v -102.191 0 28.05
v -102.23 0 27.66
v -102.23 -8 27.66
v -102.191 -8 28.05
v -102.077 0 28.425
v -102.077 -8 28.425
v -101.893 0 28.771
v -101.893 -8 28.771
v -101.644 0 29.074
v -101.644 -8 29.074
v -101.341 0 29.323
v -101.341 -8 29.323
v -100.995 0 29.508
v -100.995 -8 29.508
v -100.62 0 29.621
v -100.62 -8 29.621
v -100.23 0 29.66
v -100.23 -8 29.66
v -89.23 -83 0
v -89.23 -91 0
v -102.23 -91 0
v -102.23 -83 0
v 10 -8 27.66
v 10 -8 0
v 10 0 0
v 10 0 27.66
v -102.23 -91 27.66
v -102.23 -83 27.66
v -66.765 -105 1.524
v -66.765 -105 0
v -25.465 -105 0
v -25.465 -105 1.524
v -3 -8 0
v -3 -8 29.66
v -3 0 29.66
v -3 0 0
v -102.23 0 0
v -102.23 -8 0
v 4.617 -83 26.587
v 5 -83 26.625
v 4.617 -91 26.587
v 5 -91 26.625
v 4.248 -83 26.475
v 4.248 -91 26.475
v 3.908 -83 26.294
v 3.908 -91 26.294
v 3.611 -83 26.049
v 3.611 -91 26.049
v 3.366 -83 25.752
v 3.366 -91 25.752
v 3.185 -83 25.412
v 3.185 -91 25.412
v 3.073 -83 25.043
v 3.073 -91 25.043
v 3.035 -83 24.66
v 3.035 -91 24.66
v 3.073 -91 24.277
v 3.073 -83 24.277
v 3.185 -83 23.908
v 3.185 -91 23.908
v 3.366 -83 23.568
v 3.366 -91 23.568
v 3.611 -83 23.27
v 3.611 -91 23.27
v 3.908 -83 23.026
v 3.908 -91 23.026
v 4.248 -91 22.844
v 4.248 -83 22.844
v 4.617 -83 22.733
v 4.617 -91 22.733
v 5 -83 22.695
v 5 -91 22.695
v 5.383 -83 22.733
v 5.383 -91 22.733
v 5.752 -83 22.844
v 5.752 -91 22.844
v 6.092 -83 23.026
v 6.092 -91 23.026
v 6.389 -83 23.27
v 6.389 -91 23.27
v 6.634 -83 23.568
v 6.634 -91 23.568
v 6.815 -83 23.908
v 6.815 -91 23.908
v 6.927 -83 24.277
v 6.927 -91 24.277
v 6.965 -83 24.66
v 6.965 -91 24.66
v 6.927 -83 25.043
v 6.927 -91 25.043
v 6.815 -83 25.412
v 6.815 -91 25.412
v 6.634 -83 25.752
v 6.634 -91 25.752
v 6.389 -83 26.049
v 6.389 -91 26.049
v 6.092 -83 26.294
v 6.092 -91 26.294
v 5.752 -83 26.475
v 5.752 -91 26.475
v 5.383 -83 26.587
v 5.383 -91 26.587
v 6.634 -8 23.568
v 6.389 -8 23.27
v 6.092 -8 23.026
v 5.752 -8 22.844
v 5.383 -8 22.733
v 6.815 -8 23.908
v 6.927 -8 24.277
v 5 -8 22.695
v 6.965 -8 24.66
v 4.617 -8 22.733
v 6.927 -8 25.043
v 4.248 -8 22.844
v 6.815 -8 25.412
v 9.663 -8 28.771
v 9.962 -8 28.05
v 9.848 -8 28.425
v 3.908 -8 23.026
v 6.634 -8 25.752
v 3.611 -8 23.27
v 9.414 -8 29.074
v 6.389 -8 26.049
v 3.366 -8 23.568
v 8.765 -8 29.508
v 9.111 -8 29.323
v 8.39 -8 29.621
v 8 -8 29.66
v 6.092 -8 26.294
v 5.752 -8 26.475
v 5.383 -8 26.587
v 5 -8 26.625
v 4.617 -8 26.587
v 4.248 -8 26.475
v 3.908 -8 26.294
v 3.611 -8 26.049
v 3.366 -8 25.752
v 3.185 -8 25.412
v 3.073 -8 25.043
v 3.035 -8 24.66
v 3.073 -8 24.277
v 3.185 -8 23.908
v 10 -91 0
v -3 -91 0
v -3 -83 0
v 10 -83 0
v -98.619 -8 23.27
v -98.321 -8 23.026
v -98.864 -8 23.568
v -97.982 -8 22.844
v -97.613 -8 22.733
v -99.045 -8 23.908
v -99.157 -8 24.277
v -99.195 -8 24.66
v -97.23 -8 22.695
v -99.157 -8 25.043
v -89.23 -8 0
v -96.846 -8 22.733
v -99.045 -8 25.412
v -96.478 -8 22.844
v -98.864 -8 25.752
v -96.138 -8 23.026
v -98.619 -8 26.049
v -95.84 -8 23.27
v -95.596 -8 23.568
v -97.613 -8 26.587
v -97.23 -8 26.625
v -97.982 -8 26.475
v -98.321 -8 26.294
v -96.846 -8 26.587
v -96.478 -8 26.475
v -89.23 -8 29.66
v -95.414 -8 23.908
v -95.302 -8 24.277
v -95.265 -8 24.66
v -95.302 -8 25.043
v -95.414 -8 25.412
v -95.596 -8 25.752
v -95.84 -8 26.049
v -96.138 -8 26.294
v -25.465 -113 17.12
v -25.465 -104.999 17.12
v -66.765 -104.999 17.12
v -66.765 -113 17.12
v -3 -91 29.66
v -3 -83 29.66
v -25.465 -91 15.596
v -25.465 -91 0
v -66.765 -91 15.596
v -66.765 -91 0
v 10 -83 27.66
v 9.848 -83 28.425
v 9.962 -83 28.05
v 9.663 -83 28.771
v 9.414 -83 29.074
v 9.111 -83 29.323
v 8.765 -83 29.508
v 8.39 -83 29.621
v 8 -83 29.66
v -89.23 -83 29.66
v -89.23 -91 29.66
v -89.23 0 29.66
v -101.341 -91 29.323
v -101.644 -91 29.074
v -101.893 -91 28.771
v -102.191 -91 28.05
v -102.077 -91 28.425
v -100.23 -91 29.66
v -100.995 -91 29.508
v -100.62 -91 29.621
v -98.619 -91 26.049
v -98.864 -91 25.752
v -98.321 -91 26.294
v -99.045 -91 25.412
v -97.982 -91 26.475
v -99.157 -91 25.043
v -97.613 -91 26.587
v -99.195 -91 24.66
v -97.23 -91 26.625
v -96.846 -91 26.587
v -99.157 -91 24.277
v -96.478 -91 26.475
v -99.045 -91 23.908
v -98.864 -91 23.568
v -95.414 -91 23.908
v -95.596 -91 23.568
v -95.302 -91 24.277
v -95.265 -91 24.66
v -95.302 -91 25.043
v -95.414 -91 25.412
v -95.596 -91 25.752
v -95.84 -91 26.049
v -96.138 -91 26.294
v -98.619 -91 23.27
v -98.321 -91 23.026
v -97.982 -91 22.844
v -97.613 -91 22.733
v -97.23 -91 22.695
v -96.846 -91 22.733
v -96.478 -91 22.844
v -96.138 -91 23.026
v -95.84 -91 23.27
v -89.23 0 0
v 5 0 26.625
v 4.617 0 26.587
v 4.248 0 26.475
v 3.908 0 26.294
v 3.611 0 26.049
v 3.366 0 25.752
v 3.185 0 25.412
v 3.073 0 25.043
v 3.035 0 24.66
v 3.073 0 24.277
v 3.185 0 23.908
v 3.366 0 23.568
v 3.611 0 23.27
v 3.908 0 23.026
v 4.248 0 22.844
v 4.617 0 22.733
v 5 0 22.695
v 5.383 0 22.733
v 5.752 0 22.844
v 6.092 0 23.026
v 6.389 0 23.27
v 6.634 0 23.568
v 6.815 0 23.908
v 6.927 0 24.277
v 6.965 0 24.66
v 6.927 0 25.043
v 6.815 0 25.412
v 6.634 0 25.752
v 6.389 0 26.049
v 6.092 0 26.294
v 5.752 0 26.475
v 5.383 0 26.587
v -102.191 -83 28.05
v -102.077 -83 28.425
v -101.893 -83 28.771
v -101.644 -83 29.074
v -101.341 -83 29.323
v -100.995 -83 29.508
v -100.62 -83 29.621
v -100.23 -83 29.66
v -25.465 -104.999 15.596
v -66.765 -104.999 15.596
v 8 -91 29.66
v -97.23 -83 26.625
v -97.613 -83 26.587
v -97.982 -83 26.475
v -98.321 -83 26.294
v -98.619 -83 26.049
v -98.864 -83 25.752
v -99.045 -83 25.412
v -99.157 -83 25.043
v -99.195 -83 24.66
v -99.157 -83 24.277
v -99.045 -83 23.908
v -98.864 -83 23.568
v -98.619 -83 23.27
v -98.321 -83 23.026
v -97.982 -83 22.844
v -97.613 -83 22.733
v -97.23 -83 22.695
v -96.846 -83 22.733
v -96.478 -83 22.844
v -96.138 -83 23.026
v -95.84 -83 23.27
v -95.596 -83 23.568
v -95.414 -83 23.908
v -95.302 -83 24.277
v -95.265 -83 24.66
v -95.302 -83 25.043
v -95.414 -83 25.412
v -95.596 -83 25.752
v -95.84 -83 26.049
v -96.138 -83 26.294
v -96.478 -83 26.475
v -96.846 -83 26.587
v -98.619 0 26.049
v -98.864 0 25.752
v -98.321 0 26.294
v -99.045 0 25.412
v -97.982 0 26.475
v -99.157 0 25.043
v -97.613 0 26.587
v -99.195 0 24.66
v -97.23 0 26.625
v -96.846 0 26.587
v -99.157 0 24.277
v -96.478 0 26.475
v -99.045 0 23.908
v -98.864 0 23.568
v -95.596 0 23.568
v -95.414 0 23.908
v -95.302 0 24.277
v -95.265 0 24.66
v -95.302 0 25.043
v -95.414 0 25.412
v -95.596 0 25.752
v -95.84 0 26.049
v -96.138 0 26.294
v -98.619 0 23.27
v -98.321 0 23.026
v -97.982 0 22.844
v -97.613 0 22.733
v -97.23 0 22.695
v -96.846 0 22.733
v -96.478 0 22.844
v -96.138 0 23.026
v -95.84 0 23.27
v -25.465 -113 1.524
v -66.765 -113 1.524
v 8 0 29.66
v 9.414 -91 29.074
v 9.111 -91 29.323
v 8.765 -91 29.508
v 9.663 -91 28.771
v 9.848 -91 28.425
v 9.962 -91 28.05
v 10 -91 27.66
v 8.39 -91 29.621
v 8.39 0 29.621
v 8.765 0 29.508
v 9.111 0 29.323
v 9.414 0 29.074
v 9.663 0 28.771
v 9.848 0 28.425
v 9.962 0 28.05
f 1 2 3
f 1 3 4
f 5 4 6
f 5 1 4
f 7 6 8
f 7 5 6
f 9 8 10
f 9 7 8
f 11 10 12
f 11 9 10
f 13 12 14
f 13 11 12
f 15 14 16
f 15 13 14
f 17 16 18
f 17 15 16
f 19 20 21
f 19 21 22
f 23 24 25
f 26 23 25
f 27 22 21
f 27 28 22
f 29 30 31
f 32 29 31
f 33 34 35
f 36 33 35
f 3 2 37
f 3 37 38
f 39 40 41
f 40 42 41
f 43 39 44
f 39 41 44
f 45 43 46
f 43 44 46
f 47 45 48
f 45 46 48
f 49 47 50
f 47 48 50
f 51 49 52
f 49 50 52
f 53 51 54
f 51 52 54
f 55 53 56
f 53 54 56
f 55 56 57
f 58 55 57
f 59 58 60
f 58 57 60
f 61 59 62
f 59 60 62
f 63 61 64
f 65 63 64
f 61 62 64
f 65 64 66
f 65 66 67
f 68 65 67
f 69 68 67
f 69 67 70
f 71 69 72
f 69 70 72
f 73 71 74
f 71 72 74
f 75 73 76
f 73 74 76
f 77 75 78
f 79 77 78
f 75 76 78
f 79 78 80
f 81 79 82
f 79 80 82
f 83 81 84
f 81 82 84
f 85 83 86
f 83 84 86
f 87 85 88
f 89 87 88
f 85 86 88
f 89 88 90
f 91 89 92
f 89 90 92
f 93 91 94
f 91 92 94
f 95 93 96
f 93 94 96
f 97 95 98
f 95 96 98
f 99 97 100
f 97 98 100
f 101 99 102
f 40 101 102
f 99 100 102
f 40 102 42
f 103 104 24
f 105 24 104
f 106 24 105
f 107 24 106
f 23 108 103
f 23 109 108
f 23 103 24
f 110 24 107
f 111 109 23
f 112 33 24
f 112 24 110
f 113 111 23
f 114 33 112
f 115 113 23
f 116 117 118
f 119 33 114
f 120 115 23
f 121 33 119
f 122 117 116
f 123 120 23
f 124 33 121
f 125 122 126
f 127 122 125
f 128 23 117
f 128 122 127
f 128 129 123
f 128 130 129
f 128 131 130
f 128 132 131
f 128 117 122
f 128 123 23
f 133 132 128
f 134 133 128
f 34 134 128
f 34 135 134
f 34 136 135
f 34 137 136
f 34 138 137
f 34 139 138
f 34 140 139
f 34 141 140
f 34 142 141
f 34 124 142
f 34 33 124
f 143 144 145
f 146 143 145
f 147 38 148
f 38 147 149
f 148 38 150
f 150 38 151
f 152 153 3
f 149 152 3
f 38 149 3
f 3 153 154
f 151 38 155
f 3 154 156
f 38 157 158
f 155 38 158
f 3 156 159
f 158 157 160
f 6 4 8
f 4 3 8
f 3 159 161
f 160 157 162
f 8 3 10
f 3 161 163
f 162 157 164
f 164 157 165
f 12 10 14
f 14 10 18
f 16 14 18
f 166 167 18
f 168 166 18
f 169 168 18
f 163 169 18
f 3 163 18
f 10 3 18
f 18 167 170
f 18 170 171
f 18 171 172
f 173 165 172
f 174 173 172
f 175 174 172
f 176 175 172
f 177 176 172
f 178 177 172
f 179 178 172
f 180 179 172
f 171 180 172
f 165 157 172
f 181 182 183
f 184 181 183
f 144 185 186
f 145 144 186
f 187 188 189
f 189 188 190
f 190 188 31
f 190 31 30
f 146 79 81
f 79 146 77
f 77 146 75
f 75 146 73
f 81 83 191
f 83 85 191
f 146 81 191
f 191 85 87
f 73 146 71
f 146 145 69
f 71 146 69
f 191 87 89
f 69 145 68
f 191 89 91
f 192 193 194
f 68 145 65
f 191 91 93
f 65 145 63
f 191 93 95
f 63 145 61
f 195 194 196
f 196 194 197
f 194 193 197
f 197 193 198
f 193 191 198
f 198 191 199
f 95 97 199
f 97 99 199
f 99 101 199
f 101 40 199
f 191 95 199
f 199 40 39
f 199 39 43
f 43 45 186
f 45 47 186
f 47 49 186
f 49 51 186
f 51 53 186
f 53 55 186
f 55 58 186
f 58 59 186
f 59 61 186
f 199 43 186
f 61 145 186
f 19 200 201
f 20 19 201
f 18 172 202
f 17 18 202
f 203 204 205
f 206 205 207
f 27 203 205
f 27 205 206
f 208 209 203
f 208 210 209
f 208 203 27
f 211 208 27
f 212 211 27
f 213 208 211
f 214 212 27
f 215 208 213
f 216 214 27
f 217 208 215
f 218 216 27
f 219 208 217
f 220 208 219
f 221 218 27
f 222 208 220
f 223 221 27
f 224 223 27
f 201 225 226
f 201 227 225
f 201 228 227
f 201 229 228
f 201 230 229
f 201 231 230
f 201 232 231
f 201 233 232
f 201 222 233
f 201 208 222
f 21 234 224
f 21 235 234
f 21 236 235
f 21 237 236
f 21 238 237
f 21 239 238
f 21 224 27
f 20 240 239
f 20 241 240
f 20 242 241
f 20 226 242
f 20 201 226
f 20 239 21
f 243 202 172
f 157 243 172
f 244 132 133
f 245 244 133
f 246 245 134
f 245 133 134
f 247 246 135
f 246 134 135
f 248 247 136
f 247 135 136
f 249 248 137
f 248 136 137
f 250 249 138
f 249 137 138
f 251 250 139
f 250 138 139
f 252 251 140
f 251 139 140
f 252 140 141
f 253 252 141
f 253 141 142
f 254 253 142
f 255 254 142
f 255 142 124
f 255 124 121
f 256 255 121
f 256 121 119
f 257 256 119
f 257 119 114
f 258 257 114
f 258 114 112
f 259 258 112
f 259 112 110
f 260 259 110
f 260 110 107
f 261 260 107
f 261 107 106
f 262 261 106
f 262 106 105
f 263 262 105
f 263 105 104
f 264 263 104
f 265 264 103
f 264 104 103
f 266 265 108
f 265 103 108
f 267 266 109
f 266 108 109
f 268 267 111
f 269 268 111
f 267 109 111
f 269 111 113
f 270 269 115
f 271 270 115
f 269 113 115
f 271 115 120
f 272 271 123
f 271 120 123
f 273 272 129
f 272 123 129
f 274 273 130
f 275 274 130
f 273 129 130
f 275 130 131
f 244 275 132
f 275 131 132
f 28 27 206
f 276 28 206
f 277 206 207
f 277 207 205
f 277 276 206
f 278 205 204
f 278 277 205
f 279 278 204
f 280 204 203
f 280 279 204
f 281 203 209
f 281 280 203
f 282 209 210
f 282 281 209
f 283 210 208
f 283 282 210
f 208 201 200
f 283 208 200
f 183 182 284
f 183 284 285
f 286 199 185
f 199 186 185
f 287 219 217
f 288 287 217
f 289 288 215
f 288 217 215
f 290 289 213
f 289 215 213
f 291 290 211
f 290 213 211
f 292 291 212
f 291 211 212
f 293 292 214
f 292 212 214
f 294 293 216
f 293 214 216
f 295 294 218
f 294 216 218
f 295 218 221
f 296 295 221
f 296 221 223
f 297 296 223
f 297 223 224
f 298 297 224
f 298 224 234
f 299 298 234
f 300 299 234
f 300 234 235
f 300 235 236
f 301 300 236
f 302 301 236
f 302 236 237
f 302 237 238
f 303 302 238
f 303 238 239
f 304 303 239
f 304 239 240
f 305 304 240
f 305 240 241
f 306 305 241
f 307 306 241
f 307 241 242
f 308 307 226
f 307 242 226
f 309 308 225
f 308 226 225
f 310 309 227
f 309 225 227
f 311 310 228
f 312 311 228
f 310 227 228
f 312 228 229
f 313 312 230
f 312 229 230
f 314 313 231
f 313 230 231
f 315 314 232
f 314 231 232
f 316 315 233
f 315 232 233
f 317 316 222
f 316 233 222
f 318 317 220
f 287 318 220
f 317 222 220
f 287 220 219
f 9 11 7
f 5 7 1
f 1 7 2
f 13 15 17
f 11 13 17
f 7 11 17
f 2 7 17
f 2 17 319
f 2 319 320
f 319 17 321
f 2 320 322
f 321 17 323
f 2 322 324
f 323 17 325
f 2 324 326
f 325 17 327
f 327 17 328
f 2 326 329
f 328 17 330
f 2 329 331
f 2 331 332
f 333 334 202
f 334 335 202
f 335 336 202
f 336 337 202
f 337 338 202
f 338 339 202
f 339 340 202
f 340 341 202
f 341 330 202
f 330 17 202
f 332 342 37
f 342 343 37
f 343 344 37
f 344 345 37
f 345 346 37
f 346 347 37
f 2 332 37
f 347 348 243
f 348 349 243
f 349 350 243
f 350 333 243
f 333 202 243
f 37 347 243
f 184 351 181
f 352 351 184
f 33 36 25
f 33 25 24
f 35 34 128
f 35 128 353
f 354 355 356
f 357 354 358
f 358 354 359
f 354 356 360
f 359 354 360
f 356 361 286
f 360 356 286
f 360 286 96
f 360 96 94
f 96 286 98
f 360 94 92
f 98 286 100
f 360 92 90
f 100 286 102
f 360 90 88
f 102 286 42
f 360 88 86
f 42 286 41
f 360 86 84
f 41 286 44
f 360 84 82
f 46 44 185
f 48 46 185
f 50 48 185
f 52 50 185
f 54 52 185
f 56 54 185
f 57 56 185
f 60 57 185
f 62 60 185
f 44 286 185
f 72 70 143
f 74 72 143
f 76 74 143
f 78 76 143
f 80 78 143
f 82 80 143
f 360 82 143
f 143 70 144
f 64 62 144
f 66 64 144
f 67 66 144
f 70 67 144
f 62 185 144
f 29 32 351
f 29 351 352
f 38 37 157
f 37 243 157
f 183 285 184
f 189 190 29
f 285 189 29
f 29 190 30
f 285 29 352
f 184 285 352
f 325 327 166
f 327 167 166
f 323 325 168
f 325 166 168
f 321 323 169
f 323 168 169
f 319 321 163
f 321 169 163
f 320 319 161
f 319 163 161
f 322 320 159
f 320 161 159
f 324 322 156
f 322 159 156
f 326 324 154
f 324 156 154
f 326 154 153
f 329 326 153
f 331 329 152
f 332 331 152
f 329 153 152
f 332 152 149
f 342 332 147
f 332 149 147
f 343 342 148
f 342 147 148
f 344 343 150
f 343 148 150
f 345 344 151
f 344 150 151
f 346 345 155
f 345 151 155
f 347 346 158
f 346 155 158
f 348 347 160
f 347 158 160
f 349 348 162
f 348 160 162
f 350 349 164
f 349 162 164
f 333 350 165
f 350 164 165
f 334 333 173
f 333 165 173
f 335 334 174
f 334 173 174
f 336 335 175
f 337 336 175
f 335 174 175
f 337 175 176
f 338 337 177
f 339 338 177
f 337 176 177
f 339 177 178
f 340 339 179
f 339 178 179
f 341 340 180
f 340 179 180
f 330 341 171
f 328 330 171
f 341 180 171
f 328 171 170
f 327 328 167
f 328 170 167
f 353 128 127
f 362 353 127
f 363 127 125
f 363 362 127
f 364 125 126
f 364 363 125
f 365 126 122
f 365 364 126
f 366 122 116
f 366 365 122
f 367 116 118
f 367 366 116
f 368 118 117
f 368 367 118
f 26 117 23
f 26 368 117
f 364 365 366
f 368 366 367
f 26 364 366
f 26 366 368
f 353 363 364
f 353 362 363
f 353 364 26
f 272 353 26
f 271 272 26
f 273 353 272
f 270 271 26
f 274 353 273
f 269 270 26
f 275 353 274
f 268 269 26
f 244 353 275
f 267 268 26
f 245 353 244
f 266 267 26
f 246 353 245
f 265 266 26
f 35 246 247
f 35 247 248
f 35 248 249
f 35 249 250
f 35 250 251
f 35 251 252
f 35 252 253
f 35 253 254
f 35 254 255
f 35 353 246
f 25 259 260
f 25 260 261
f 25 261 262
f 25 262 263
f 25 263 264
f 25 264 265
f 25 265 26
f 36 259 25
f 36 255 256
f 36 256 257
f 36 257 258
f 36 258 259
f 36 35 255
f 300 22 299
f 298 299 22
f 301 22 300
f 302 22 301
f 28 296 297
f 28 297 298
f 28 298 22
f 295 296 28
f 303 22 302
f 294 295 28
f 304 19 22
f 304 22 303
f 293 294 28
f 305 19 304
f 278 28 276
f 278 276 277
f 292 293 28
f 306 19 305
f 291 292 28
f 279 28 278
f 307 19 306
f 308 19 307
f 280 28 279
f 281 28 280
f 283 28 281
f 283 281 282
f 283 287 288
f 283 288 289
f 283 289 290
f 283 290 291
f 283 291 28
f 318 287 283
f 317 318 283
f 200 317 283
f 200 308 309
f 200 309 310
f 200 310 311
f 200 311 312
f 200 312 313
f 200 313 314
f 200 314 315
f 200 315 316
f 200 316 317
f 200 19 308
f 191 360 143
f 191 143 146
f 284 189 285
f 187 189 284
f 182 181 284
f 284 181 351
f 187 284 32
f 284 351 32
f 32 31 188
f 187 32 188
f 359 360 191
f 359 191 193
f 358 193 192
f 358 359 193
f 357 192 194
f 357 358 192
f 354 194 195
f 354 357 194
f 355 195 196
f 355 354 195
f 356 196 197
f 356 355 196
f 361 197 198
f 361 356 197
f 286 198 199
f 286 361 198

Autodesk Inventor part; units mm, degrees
ref_plane "YZ Plane" through (0, 0, 0) normal (1, 0, 0) x (0, 1, 0)
ref_plane "XZ Plane" through (0, 0, 0) normal (0, 1, 0) x (-1, 0, 0)
ref_plane "Work Plane1" through (-89.882, 196577.8405, 29.6599) normal (0, 0, -1) x (-1, 0, 0)
sketch "Sketch3" plane through (0, -8, 26.5711) normal (1, 0, 0) x (0, 1, 0)
  line L0 (30.2, 3.0888) -> (-125.2, 3.0888) construction
  line L1 (-75, -26.5711) -> (0, -26.5711) construction
  line L2 (8, -26.5711) -> (0, -26.5711)
  line L3 (0, -26.5711) -> (0, 3.0888)
  line L4 (0, 3.0888) -> (8, 3.0888)
  line L5 (8, 3.0888) -> (8, -26.5711)
  line L6 (-83, 0) -> (-83, -23.5711) construction
  line L7 (-83, -26.5711) -> (-75, -26.5711)
  line L8 (-75, -26.5711) -> (-75, 3.0888)
  line L9 (-75, 3.0888) -> (-83, 3.0888)
  line L10 (-83, 3.0888) -> (-83, -26.5711)
extrude "Extrusion2" add sketch "Sketch3" along normal blind 10 and the other way blind 3
sketch "Sketch4" plane through (-3, 0, 29.6599) normal (0, 1, 0) x (1, 0, 0)
  circle A0 centre (8, 5) radius 1.965
  line L0 (13, 29.6599) -> (13, 0) projected
  line L1 (-109.6757, 0) -> (33.4459, 0) projected
  point P0 (3, 29.6599)
  dimension "d19" = 3.93
  dimension "d20" = 5
  dimension "d21" = 5
hole "Hole2" at (5, 0, 24.6599) direction (0, -1, 0) diameter 3.93 end through all
fillet "Fillet1" radius 2 2 edges at (10, -4, 29.6599) (10, -87, 29.6599)
sketch "Sketch5" plane through (-92.2297, -8, 3) normal (-1, 0, 0) x (0, -1, 0)
  line L0 (-8, -3) -> (0, -3) projected
  line L1 (0, -3) -> (0, 26.6599) projected
  line L2 (-8, -3) -> (0, -3)
  line L3 (0, -3) -> (0, 26.6599)
  line L4 (0, 26.6599) -> (-8, 26.6599)
  line L5 (-8, 26.6599) -> (-8, -3)
  line L6 (83, -3) -> (75, -3) projected
  line L7 (83, 26.6599) -> (75, 26.6599) projected
  line L8 (83, -3) -> (75, -3)
  line L9 (75, -3) -> (75, 26.6599)
  line L10 (75, 26.6599) -> (83, 26.6599)
  line L11 (83, 26.6599) -> (83, -3)
extrude "Extrusion3" add sketch "Sketch5" along normal blind 10 and the other way blind 3
sketch "Sketch6" plane through (-102.2297, 0, 0) normal (0, 1, 0) x (1, 0, 0)
  circle A0 centre (5, -24.6599) radius 1.965
  line L0 (0, -29.6599) -> (0, 0) projected
  line L1 (13, -29.6599) -> (0, -29.6599) projected
  point P0 (102.2297, 0)
  dimension "d34" = 3.93
  dimension "d35" = 5
  dimension "d36" = 5
hole "Hole3" at (-97.2297, 0, 24.6599) direction (0, -1, 0) diameter 3.93 end through all
fillet "Fillet2" radius 2 2 edges at (-102.2297, -4, 29.6599) (-102.2297, -87, 29.6599)
sketch "Sketch9" plane through (-27.41, -83, 0) normal (0, 0, -1) x (-1, 0, 0)
  line L0 (-24.41, -8) -> (61.8197, -8) construction
  line L1 (-1.9451, -8) -> (-1.9451, -26) construction
  line L2 (39.3549, -26) -> (39.3549, -8) construction
  line L3 (0.0549, -28) -> (37.3549, -28) construction
  line L4 (-1.9451, -8) -> (39.3549, -8)
  line L5 (39.3549, -8) -> (39.3549, -30)
  line L6 (-1.9451, -30) -> (-1.9451, -8)
  line L7 (-1.9451, -30) -> (39.3549, -30)
  point P0 (-27.41, 83)
  dimension "d50" = 2
extrude "Extrusion5" add sketch "Sketch9" against normal blind 17.12
sketch "Sketch12" plane through (-27.41, -83, 17.12) normal (0, 0, 1) x (1, 0, 0)
  line L0 (1.9451, -8) -> (-39.3549, -8) construction
  line L1 (1.9451, -30) -> (1.9451, -8) construction
  line L2 (1.9451, -21.9992) -> (-39.4839, -21.9992) construction
  line L3 (-39.3549, -8) -> (-39.3549, -30) projected
  line L4 (-39.3549, -8) -> (1.9451, -8)
  line L5 (1.9451, -8) -> (1.9451, -21.9992)
  line L6 (1.9451, -21.9992) -> (-39.3549, -21.9992)
  line L7 (-39.3549, -21.9992) -> (-39.3549, -8)
  point P0 (27.41, 83)
extrude "Extrusion6" cut sketch "Sketch12" against normal blind 1.524
sketch "Sketch13" plane through (-27.41, -83, 0) normal (0, 0, -1) x (-1, 0, 0)
  line L0 (39.3549, -30) -> (-1.9451, -30) projected
  line L1 (39.3549, -8) -> (39.3549, -30) projected
  line L2 (-1.9451, -30) -> (39.3549, -30)
  line L3 (39.3549, -30) -> (39.3549, -22)
  line L4 (39.3549, -22) -> (-1.9451, -22)
  line L5 (-1.9451, -22) -> (-1.9451, -30)
  point P0 (-27.41, 83)
  dimension "d55" = 8
extrude "Extrusion7" cut sketch "Sketch13" against normal blind 1.524
ref_plane "Work Plane3" through (-46.1149, -8, 26.5711) normal (1, 0, 0) x (0, 0, -1)
properties part number "e4-phone_1piece pivot"
